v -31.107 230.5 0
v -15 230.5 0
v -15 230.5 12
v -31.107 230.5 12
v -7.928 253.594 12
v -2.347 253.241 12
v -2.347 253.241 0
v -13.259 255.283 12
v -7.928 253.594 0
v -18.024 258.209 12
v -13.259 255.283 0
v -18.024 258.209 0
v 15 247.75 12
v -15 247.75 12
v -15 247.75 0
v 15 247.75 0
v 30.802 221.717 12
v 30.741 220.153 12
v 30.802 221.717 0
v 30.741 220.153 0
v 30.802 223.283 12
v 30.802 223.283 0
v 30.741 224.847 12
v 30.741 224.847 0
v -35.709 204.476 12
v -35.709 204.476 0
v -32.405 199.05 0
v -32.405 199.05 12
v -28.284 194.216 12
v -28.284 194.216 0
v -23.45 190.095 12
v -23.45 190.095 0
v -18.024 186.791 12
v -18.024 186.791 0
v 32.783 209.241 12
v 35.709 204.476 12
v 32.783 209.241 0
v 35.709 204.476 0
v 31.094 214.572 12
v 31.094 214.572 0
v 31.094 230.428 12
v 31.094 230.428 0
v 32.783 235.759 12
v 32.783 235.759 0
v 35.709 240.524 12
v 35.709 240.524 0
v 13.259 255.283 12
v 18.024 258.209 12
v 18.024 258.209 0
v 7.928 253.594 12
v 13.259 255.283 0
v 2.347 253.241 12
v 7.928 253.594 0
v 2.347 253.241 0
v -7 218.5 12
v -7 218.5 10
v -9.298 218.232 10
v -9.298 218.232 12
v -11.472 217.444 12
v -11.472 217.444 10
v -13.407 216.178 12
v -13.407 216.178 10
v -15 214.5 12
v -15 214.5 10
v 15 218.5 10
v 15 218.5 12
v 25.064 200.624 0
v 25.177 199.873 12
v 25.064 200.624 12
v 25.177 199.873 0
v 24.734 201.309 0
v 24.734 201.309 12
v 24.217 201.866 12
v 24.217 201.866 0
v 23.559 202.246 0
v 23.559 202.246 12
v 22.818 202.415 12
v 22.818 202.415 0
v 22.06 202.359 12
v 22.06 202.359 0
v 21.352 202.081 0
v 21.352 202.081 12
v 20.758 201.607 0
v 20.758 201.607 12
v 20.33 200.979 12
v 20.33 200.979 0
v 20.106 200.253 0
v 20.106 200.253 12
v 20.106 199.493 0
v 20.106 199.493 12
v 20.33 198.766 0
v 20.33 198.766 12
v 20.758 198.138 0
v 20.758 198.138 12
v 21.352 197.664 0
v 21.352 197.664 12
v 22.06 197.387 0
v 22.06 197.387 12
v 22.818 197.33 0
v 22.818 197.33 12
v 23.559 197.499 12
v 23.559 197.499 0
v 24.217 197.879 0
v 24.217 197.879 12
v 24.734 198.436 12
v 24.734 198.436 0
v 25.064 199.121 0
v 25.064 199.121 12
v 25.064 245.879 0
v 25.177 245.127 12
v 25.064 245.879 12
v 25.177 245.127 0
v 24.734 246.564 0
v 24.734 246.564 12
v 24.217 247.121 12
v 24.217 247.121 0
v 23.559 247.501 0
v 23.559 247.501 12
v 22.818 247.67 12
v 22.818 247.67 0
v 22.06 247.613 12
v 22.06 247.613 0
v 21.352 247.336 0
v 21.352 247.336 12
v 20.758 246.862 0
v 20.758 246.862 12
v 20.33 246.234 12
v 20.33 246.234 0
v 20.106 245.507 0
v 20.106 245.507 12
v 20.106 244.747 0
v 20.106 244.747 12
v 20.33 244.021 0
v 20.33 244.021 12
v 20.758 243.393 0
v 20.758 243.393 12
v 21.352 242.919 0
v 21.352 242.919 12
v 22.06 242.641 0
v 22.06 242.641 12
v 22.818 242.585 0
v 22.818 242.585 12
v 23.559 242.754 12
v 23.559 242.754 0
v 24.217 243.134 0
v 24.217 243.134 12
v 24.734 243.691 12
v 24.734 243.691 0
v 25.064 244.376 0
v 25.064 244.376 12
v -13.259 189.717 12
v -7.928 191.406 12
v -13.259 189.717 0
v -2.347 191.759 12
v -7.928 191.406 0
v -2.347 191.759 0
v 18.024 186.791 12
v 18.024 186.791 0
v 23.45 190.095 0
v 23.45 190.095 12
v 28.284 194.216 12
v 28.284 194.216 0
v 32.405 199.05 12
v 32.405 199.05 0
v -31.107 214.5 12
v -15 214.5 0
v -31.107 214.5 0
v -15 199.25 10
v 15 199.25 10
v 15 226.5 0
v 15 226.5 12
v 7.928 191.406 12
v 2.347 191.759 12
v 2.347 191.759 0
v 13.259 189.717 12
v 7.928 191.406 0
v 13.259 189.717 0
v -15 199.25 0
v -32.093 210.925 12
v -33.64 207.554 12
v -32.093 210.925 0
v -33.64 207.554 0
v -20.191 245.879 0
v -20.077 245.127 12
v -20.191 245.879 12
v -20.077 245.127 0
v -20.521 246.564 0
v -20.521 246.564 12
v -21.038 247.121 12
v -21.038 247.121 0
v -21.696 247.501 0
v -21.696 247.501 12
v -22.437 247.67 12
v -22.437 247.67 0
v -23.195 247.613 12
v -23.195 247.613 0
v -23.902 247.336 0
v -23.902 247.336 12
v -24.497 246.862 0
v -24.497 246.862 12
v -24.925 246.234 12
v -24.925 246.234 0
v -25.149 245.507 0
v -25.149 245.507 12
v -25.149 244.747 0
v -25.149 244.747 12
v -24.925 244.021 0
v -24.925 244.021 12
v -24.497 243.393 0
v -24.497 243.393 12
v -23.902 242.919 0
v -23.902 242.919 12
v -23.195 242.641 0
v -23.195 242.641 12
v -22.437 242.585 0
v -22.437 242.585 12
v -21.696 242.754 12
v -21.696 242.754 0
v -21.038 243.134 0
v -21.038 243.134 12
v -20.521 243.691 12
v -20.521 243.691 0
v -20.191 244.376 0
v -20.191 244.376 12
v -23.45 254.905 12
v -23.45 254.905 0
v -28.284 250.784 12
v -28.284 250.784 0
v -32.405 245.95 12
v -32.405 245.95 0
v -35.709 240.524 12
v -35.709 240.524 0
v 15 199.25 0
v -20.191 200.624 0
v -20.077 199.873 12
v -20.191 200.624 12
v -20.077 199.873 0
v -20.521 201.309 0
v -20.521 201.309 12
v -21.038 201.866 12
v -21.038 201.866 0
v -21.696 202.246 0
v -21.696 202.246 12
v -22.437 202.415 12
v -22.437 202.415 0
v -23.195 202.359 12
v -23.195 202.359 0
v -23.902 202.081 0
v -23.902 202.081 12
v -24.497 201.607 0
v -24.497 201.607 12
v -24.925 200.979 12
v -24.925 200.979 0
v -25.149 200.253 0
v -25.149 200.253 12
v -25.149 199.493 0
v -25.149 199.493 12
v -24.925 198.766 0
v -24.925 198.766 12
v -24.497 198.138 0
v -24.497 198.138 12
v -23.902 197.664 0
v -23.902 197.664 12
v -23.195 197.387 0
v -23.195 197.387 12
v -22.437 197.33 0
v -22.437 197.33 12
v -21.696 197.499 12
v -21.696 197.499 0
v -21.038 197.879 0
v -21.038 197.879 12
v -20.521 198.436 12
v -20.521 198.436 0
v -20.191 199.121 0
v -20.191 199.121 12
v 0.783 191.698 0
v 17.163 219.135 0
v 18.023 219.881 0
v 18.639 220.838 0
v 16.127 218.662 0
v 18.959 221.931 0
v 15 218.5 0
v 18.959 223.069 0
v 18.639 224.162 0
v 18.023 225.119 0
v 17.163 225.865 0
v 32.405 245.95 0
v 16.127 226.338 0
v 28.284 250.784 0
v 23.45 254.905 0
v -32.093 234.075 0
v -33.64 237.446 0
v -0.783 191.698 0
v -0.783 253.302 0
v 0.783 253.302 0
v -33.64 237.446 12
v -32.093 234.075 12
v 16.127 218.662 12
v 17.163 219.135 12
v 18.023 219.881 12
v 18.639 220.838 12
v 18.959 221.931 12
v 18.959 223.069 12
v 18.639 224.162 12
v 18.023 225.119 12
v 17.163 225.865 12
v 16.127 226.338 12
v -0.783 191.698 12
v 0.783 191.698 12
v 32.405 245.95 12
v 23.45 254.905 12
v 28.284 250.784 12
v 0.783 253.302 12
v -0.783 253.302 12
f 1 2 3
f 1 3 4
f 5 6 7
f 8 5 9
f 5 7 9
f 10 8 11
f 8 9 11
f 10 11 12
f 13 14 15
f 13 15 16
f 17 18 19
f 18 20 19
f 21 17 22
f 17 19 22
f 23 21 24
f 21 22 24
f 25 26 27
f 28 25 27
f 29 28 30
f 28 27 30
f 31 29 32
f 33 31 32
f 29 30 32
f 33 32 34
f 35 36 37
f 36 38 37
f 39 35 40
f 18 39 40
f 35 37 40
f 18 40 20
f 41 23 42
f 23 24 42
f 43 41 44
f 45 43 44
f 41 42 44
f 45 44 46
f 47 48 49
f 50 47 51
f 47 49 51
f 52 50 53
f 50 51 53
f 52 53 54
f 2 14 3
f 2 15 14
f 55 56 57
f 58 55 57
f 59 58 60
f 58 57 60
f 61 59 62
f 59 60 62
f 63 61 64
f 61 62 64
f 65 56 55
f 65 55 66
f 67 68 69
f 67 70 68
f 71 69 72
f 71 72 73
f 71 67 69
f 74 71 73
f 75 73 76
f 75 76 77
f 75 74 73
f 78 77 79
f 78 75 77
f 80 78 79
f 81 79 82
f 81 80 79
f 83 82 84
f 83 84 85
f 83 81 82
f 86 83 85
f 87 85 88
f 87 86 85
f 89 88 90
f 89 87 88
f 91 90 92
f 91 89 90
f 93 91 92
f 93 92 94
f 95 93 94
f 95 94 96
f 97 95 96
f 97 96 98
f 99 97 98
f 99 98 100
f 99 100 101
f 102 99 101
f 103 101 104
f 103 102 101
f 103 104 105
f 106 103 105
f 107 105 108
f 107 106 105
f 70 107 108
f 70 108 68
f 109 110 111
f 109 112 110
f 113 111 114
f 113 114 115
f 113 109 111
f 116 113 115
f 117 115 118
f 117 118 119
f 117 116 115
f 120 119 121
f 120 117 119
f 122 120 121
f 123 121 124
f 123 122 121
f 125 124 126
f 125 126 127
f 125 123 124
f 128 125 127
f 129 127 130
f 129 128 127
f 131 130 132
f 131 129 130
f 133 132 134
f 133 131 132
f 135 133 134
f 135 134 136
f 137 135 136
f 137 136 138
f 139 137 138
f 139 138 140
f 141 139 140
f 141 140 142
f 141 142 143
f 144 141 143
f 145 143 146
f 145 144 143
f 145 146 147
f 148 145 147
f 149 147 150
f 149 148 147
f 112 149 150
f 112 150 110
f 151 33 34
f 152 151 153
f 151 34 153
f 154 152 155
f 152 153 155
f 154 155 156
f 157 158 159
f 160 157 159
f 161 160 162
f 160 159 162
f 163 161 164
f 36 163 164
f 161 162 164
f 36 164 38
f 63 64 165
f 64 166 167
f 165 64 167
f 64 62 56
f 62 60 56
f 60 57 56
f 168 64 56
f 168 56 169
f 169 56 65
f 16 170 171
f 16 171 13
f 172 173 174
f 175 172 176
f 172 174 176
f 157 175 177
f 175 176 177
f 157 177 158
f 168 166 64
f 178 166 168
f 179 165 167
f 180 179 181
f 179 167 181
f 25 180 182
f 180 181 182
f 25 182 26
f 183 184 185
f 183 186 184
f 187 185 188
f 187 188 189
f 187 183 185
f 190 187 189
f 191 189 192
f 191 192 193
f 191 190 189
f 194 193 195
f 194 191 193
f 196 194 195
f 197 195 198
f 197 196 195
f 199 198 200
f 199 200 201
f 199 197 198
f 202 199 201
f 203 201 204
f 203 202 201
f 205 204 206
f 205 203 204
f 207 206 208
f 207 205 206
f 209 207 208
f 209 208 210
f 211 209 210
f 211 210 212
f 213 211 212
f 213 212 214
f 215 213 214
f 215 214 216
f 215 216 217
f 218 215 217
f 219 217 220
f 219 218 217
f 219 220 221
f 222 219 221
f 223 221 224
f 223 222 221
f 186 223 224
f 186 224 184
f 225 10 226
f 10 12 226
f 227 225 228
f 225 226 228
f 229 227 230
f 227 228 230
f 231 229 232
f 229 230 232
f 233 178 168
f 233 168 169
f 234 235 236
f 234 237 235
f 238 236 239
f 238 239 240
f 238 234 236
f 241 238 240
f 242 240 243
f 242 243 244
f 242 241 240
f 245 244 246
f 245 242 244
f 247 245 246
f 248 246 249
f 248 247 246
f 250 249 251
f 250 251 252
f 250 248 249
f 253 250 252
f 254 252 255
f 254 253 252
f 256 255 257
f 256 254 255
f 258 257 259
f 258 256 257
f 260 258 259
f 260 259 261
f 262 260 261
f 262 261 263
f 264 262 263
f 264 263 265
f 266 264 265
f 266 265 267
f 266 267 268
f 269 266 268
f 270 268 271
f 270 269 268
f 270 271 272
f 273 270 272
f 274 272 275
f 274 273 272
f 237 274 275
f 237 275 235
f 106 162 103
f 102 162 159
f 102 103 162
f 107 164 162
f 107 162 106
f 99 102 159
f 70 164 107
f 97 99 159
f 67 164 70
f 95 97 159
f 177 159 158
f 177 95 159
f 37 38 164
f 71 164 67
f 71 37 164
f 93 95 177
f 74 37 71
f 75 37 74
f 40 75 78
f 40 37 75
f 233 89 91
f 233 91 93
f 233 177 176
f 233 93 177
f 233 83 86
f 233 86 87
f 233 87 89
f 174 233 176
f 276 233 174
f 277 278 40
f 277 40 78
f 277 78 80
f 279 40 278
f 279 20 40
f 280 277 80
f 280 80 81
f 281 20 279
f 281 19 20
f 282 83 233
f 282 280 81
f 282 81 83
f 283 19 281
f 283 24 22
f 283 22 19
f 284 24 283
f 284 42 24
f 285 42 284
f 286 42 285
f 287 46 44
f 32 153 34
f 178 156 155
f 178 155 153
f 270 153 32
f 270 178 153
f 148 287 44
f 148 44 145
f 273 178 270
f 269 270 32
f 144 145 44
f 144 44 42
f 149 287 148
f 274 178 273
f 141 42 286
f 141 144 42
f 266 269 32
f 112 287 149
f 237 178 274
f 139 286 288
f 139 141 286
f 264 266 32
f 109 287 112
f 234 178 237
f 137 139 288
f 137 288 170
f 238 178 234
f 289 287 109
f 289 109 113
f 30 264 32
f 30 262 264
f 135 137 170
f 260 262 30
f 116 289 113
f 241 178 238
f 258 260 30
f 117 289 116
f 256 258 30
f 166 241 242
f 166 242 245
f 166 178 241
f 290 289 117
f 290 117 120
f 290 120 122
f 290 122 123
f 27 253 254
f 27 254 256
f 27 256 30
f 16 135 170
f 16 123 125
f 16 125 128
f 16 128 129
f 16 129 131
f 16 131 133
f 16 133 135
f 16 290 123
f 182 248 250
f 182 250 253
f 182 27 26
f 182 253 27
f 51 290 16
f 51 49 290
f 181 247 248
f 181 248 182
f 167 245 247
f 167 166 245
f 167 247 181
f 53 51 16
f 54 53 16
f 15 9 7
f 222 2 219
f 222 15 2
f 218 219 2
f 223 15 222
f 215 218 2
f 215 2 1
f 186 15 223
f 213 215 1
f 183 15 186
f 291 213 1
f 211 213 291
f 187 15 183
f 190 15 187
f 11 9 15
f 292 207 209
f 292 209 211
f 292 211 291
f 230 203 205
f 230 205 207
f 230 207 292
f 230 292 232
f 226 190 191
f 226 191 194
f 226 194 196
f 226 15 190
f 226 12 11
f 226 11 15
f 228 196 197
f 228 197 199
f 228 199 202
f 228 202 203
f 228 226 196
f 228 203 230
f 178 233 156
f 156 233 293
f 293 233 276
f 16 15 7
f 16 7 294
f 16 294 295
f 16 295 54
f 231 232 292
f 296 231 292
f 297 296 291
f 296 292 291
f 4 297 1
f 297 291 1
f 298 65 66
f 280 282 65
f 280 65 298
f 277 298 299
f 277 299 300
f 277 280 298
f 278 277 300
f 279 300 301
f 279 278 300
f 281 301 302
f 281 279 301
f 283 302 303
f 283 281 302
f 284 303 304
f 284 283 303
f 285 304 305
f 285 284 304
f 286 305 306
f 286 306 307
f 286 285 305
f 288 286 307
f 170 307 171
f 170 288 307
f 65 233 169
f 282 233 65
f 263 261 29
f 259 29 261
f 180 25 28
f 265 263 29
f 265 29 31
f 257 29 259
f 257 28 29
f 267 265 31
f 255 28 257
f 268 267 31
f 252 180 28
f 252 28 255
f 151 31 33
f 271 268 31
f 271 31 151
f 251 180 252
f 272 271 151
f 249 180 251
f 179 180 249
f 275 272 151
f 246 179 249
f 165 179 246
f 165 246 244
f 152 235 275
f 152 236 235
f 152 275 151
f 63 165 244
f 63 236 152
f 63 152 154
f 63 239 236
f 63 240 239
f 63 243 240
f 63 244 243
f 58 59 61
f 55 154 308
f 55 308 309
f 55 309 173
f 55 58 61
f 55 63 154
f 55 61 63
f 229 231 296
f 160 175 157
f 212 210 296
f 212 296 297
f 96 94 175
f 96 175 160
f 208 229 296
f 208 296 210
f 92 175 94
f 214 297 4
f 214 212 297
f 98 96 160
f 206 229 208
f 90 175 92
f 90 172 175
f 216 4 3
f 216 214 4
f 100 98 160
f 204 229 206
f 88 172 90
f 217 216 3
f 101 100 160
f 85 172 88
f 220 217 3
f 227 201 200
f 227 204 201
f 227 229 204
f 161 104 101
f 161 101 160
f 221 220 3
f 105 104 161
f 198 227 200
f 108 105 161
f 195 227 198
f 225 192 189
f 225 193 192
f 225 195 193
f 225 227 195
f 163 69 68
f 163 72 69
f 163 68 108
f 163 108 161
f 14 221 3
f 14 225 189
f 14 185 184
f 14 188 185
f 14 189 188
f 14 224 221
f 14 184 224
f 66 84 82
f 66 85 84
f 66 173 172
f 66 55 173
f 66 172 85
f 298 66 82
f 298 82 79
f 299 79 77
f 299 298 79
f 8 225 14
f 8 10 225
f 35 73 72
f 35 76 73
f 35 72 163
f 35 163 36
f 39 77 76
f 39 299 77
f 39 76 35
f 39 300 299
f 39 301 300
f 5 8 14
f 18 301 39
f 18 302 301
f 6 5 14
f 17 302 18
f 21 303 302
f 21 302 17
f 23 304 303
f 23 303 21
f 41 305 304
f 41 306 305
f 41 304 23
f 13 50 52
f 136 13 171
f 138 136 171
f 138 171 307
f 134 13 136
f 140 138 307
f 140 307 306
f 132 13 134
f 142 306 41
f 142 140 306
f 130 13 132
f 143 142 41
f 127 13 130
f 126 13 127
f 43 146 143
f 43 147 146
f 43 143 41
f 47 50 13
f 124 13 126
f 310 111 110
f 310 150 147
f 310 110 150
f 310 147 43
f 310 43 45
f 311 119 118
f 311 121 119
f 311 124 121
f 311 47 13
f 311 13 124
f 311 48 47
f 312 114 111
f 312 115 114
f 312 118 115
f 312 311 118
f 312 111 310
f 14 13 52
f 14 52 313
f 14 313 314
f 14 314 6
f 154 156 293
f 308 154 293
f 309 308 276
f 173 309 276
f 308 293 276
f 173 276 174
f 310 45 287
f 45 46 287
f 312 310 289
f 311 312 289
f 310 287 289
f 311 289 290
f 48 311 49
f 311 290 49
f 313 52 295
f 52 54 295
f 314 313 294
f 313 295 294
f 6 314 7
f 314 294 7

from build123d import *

# Parameters (mm, degrees)
SKETCH1_R           = 2.55
BOSS_EXTRUDE2_DEPTH = 10
SKETCH2_R           = 2.55
BOSS_EXTRUDE3_DEPTH = 2
SKETCH3_W           = 30
SKETCH3_H           = 2
CUT_EXTRUDE1_DEPTH  = 35
SKETCH4_W           = 19.809531665
SKETCH4_H           = 16
CUT_EXTRUDE2_DEPTH  = 19
FILLET1_R           = 10


with BuildPart() as part:
    # Sketch1 → Boss-Extrude2 (new body)
    with BuildSketch(Plane.XY):
        with BuildLine():
            ThreePointArc((18.024150889, 186.79103775), (10.644862344, 190.724335457), (2.347067513, 191.759386777))
            ThreePointArc((2.347067513, 191.759386777), (0, 191.690468331), (-2.347067513, 191.759386777))
            ThreePointArc((-2.347067513, 191.759386777), (-10.644862344, 190.724335457), (-18.024150889, 186.79103775))
            ThreePointArc((-18.024150889, 186.79103775), (-28.284271247, 194.215728749), (-35.708962247, 204.475849108))
            ThreePointArc((-35.708962247, 204.475849108), (-31.77566454, 211.855137653), (-30.74061322, 220.152932484))
            ThreePointArc((-30.74061322, 220.152932484), (-30.809531665, 222.499999997), (-30.74061322, 224.84706751))
            ThreePointArc((-30.74061322, 224.84706751), (-31.77566454, 233.14486234), (-35.708962247, 240.524150885))
            ThreePointArc((-35.708962247, 240.524150885), (-28.284271247, 250.784271244), (-18.024150889, 258.208962244))
            ThreePointArc((-18.024150889, 258.208962244), (-10.644862344, 254.275664537), (-2.347067513, 253.240613217))
            ThreePointArc((-2.347067513, 253.240613217), (0, 253.309531662), (2.347067513, 253.240613217))
            ThreePointArc((2.347067513, 253.240613217), (10.644862344, 254.275664537), (18.024150889, 258.208962244))
            ThreePointArc((18.024150889, 258.208962244), (28.284271247, 250.784271244), (35.708962247, 240.524150885))
            ThreePointArc((35.708962247, 240.524150885), (31.77566454, 233.14486234), (30.74061322, 224.84706751))
            ThreePointArc((30.74061322, 224.84706751), (30.809531665, 222.499999997), (30.74061322, 220.152932484))
            ThreePointArc((30.74061322, 220.152932484), (31.77566454, 211.855137653), (35.708962247, 204.475849108))
            ThreePointArc((35.708962247, 204.475849108), (28.284271247, 194.215728749), (18.024150889, 186.79103775))
        make_face()
        with Locations((-22.627416998, 245.127416995)):
            Circle(SKETCH1_R, mode=Mode.SUBTRACT)
        with Locations((-22.627416998, 199.872582999)):
            Circle(SKETCH1_R, mode=Mode.SUBTRACT)
        with Locations((22.627416998, 199.872582999)):
            Circle(SKETCH1_R, mode=Mode.SUBTRACT)
        with Locations((22.627416998, 245.127416995)):
            Circle(SKETCH1_R, mode=Mode.SUBTRACT)
        with BuildLine():
            Line((-15, 218.499999997), (-15, 199.25))
            Line((-15, 199.25), (15, 199.25))
            Line((15, 199.25), (15, 218.499999997))
            ThreePointArc((15, 218.499999997), (19, 222.499999997), (15, 226.499999997))
            Line((15, 226.499999997), (15, 245.749999994))
            Line((15, 245.749999994), (-15, 245.749999994))
            Line((-15, 245.749999994), (-15, 226.499999997))
            ThreePointArc((-15, 226.499999997), (-19, 222.499999997), (-15, 218.499999997))
        make_face(mode=Mode.SUBTRACT)
    extrude(amount=BOSS_EXTRUDE2_DEPTH)

    # Sketch2 → Boss-Extrude3 (add)
    with BuildSketch(Plane.XY.offset(10)):
        with BuildLine():
            ThreePointArc((18.024150889, 186.79103775), (28.284271247, 194.215728749), (35.708962247, 204.475849108))
            ThreePointArc((35.708962247, 204.475849108), (31.77566454, 211.855137653), (30.74061322, 220.152932484))
            ThreePointArc((30.74061322, 220.152932484), (30.809531665, 222.499999997), (30.74061322, 224.84706751))
            ThreePointArc((30.74061322, 224.84706751), (31.77566454, 233.14486234), (35.708962247, 240.524150885))
            ThreePointArc((35.708962247, 240.524150885), (28.284271247, 250.784271244), (18.024150889, 258.208962244))
            ThreePointArc((18.024150889, 258.208962244), (10.644862344, 254.275664537), (2.347067513, 253.240613217))
            ThreePointArc((2.347067513, 253.240613217), (0, 253.309531662), (-2.347067513, 253.240613217))
            ThreePointArc((-2.347067513, 253.240613217), (-10.644862344, 254.275664537), (-18.024150889, 258.208962244))
            ThreePointArc((-18.024150889, 258.208962244), (-28.284271247, 250.784271244), (-35.708962247, 240.524150885))
            ThreePointArc((-35.708962247, 240.524150885), (-31.77566454, 233.14486234), (-30.74061322, 224.84706751))
            ThreePointArc((-30.74061322, 224.84706751), (-30.809531665, 222.499999997), (-30.74061322, 220.152932484))
            ThreePointArc((-30.74061322, 220.152932484), (-31.77566454, 211.855137653), (-35.708962247, 204.475849108))
            ThreePointArc((-35.708962247, 204.475849108), (-28.284271247, 194.215728749), (-18.024150889, 186.79103775))
            ThreePointArc((-18.024150889, 186.79103775), (-10.644862344, 190.724335457), (-2.347067513, 191.759386777))
            ThreePointArc((-2.347067513, 191.759386777), (0, 191.690468331), (2.347067513, 191.759386777))
            ThreePointArc((2.347067513, 191.759386777), (10.644862344, 190.724335457), (18.024150889, 186.79103775))
        make_face()
        with Locations((-22.627416998, 245.127416995)):
            Circle(SKETCH2_R, mode=Mode.SUBTRACT)
        with Locations((-22.627416998, 199.872582999)):
            Circle(SKETCH2_R, mode=Mode.SUBTRACT)
        with Locations((22.627416998, 199.872582999)):
            Circle(SKETCH2_R, mode=Mode.SUBTRACT)
        with Locations((22.627416998, 245.127416995)):
            Circle(SKETCH2_R, mode=Mode.SUBTRACT)
        with BuildLine():
            Line((-15, 245.749999994), (-15, 226.499999997))
            ThreePointArc((-15, 226.499999997), (-19, 222.499999997), (-15, 218.499999997))
            Line((-15, 218.499999997), (15, 218.499999997))
            ThreePointArc((15, 218.499999997), (19, 222.499999997), (15, 226.499999997))
            Line((15, 226.499999997), (15, 245.749999994))
            Line((15, 245.749999994), (-15, 245.749999994))
        make_face(mode=Mode.SUBTRACT)
    extrude(amount=BOSS_EXTRUDE3_DEPTH)

    # Sketch3 → Cut-Extrude1 (cut)
    with BuildSketch(Plane.XY.offset(12)):
        with Locations((0, 246.749999994)):
            Rectangle(SKETCH3_W, SKETCH3_H)
    extrude(amount=-CUT_EXTRUDE1_DEPTH, mode=Mode.SUBTRACT)

    # Sketch4 → Cut-Extrude2 (cut)
    with BuildSketch(Plane(origin=(0, 0, 0), x_dir=(-1, 0, 0), z_dir=(0, 0, -1))):
        with Locations((24.904765833, 222.499999997)):
            Rectangle(SKETCH4_W, SKETCH4_H)
    extrude(amount=-CUT_EXTRUDE2_DEPTH, mode=Mode.SUBTRACT)

    # Fillet1
    # the kernel refuses this fillet: 10 mm, written as the material it takes off along each edge
    with BuildSketch(Plane(origin=(-15, 218.499999997, -10), x_dir=(0, -1, 0), z_dir=(0, 0, 1))) as fillet1_piece_1:
        with BuildLine():
            CenterArc((10, 8), FILLET1_R, 180, 53.130102354)
            Line((0, 8), (-0.2, 8))
            Line((-0.2, 8), (-0.2, 0))
            Line((-0.2, 0), (0, -0.2))
            ThreePointArc((0, -0.2), (2, -0.2), (3.88, -0.16))
            Line((3.88, -0.16), (4, 0))
        make_face()
    extrude(amount=42, mode=Mode.SUBTRACT)


solid = part.part
